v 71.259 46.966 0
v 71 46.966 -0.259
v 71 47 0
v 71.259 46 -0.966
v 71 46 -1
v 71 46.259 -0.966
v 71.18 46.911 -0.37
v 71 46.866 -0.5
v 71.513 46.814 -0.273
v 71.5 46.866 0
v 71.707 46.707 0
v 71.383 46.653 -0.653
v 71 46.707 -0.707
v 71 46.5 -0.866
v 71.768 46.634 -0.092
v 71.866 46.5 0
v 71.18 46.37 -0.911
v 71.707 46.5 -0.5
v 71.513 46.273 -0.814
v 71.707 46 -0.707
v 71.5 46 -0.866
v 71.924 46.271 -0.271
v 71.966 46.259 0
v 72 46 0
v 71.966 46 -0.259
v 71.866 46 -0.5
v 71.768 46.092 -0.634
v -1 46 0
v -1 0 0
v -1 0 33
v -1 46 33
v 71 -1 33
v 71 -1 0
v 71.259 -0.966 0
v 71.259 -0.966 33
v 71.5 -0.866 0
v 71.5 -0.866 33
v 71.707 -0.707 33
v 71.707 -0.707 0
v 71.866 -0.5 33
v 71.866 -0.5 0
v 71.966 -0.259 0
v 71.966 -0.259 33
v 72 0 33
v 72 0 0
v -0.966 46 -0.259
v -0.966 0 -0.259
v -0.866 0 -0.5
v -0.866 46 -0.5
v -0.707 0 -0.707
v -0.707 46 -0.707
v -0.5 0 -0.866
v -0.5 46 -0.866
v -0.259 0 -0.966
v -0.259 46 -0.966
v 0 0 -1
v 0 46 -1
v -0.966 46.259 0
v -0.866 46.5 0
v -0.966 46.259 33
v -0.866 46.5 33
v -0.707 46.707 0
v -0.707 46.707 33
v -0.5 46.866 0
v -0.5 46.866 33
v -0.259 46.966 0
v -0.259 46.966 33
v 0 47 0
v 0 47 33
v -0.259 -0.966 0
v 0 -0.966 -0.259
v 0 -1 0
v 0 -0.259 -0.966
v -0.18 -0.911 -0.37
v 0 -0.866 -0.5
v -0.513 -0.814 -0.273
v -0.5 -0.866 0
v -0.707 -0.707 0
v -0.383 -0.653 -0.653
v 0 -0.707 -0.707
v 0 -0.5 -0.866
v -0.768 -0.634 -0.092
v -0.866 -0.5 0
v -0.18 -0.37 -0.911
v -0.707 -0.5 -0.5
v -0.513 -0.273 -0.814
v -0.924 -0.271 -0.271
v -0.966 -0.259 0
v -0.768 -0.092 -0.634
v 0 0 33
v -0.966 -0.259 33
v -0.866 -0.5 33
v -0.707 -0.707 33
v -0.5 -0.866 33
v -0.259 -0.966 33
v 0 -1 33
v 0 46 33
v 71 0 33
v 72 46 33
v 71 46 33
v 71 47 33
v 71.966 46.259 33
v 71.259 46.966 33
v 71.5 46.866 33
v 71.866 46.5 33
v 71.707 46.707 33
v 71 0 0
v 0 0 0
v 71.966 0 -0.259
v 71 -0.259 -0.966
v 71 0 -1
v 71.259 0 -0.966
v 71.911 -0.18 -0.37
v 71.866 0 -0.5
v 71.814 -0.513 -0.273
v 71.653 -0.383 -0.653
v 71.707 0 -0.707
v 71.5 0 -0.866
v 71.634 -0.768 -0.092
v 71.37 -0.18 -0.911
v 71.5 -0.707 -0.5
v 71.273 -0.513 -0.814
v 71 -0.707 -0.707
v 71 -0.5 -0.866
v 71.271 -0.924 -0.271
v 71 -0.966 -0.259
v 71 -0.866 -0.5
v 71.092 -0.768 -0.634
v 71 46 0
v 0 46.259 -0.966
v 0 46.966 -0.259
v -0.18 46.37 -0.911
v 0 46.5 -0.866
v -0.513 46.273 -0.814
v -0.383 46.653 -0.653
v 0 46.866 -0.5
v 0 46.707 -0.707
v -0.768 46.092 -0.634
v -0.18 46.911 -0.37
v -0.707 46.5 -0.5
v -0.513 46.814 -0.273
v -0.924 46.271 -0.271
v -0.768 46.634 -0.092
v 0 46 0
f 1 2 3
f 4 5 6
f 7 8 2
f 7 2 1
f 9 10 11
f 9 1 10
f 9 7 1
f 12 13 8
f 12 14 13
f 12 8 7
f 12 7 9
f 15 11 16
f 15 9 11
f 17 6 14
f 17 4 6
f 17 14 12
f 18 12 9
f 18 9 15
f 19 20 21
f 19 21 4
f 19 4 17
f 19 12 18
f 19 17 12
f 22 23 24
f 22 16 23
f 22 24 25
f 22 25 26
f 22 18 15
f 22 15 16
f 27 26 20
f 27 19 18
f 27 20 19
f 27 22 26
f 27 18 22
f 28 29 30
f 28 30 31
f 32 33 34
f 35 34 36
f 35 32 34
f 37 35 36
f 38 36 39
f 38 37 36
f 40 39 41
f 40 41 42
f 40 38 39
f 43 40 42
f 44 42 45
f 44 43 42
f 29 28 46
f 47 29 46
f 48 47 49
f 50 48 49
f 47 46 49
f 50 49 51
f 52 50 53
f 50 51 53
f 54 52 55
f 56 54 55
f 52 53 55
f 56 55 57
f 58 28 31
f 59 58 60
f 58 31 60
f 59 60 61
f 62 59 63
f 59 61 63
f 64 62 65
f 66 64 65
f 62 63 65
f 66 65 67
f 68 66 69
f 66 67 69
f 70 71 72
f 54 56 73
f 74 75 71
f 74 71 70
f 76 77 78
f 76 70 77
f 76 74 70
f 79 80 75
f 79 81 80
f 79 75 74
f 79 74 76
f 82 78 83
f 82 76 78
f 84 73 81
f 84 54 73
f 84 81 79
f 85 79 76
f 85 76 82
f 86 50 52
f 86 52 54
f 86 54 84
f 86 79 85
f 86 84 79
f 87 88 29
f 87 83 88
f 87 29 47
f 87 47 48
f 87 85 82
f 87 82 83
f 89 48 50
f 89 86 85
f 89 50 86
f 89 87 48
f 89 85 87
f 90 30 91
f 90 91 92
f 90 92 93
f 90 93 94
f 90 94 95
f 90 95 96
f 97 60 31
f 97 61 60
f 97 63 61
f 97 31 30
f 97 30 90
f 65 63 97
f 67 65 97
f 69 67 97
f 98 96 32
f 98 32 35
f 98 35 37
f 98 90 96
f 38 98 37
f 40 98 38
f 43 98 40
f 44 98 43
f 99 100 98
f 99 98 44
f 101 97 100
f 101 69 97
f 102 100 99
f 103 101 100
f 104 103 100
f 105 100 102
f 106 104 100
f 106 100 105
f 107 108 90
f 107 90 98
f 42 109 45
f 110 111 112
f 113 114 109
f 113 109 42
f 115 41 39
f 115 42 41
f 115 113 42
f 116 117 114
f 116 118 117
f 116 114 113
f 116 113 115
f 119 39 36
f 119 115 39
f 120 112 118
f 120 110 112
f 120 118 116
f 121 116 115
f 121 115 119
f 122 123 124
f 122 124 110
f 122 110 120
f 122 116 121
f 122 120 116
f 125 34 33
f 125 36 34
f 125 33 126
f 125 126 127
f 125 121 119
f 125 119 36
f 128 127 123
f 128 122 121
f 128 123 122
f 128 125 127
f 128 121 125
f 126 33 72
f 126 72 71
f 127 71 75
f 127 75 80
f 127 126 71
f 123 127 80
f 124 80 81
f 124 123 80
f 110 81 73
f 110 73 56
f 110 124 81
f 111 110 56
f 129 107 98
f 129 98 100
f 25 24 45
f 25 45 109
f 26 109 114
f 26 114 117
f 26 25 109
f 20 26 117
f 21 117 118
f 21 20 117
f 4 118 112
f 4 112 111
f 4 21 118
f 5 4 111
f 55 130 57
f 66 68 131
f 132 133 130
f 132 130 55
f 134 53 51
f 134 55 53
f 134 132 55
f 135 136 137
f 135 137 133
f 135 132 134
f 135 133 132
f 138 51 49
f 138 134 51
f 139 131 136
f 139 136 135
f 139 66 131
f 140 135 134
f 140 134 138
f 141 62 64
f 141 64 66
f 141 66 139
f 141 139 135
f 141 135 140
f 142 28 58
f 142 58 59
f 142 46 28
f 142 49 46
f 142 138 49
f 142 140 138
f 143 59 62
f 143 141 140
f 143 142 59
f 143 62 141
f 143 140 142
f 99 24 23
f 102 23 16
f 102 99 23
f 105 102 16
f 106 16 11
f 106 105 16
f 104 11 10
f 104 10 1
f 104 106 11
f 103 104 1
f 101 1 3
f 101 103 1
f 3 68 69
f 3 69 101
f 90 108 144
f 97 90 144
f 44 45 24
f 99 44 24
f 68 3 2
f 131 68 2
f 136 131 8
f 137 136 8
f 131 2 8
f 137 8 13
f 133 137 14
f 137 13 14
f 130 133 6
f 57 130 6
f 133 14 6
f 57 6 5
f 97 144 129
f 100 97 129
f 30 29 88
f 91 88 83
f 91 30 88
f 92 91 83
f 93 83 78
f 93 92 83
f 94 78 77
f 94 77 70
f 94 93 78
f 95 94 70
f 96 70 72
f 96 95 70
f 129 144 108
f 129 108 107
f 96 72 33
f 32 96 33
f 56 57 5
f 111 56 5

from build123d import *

# Parameters (mm, degrees)
SKETCH_W    = 71
SKETCH_H    = 46
PAD_DEPTH   = 33
THICKNESS_T = 1


with BuildPart() as part:
    # Sketch → Pad (new body)
    with BuildSketch(Plane.XY):
        with Locations((35.5, 23)):
            Rectangle(SKETCH_W, SKETCH_H)
    extrude(amount=PAD_DEPTH)

    # Thickness
    thickness_openings = [part.faces().sort_by_distance(p)[0] for p in [
        (35.5, 23, 33),
    ]]
    offset(amount=THICKNESS_T, openings=thickness_openings)


solid = part.part
